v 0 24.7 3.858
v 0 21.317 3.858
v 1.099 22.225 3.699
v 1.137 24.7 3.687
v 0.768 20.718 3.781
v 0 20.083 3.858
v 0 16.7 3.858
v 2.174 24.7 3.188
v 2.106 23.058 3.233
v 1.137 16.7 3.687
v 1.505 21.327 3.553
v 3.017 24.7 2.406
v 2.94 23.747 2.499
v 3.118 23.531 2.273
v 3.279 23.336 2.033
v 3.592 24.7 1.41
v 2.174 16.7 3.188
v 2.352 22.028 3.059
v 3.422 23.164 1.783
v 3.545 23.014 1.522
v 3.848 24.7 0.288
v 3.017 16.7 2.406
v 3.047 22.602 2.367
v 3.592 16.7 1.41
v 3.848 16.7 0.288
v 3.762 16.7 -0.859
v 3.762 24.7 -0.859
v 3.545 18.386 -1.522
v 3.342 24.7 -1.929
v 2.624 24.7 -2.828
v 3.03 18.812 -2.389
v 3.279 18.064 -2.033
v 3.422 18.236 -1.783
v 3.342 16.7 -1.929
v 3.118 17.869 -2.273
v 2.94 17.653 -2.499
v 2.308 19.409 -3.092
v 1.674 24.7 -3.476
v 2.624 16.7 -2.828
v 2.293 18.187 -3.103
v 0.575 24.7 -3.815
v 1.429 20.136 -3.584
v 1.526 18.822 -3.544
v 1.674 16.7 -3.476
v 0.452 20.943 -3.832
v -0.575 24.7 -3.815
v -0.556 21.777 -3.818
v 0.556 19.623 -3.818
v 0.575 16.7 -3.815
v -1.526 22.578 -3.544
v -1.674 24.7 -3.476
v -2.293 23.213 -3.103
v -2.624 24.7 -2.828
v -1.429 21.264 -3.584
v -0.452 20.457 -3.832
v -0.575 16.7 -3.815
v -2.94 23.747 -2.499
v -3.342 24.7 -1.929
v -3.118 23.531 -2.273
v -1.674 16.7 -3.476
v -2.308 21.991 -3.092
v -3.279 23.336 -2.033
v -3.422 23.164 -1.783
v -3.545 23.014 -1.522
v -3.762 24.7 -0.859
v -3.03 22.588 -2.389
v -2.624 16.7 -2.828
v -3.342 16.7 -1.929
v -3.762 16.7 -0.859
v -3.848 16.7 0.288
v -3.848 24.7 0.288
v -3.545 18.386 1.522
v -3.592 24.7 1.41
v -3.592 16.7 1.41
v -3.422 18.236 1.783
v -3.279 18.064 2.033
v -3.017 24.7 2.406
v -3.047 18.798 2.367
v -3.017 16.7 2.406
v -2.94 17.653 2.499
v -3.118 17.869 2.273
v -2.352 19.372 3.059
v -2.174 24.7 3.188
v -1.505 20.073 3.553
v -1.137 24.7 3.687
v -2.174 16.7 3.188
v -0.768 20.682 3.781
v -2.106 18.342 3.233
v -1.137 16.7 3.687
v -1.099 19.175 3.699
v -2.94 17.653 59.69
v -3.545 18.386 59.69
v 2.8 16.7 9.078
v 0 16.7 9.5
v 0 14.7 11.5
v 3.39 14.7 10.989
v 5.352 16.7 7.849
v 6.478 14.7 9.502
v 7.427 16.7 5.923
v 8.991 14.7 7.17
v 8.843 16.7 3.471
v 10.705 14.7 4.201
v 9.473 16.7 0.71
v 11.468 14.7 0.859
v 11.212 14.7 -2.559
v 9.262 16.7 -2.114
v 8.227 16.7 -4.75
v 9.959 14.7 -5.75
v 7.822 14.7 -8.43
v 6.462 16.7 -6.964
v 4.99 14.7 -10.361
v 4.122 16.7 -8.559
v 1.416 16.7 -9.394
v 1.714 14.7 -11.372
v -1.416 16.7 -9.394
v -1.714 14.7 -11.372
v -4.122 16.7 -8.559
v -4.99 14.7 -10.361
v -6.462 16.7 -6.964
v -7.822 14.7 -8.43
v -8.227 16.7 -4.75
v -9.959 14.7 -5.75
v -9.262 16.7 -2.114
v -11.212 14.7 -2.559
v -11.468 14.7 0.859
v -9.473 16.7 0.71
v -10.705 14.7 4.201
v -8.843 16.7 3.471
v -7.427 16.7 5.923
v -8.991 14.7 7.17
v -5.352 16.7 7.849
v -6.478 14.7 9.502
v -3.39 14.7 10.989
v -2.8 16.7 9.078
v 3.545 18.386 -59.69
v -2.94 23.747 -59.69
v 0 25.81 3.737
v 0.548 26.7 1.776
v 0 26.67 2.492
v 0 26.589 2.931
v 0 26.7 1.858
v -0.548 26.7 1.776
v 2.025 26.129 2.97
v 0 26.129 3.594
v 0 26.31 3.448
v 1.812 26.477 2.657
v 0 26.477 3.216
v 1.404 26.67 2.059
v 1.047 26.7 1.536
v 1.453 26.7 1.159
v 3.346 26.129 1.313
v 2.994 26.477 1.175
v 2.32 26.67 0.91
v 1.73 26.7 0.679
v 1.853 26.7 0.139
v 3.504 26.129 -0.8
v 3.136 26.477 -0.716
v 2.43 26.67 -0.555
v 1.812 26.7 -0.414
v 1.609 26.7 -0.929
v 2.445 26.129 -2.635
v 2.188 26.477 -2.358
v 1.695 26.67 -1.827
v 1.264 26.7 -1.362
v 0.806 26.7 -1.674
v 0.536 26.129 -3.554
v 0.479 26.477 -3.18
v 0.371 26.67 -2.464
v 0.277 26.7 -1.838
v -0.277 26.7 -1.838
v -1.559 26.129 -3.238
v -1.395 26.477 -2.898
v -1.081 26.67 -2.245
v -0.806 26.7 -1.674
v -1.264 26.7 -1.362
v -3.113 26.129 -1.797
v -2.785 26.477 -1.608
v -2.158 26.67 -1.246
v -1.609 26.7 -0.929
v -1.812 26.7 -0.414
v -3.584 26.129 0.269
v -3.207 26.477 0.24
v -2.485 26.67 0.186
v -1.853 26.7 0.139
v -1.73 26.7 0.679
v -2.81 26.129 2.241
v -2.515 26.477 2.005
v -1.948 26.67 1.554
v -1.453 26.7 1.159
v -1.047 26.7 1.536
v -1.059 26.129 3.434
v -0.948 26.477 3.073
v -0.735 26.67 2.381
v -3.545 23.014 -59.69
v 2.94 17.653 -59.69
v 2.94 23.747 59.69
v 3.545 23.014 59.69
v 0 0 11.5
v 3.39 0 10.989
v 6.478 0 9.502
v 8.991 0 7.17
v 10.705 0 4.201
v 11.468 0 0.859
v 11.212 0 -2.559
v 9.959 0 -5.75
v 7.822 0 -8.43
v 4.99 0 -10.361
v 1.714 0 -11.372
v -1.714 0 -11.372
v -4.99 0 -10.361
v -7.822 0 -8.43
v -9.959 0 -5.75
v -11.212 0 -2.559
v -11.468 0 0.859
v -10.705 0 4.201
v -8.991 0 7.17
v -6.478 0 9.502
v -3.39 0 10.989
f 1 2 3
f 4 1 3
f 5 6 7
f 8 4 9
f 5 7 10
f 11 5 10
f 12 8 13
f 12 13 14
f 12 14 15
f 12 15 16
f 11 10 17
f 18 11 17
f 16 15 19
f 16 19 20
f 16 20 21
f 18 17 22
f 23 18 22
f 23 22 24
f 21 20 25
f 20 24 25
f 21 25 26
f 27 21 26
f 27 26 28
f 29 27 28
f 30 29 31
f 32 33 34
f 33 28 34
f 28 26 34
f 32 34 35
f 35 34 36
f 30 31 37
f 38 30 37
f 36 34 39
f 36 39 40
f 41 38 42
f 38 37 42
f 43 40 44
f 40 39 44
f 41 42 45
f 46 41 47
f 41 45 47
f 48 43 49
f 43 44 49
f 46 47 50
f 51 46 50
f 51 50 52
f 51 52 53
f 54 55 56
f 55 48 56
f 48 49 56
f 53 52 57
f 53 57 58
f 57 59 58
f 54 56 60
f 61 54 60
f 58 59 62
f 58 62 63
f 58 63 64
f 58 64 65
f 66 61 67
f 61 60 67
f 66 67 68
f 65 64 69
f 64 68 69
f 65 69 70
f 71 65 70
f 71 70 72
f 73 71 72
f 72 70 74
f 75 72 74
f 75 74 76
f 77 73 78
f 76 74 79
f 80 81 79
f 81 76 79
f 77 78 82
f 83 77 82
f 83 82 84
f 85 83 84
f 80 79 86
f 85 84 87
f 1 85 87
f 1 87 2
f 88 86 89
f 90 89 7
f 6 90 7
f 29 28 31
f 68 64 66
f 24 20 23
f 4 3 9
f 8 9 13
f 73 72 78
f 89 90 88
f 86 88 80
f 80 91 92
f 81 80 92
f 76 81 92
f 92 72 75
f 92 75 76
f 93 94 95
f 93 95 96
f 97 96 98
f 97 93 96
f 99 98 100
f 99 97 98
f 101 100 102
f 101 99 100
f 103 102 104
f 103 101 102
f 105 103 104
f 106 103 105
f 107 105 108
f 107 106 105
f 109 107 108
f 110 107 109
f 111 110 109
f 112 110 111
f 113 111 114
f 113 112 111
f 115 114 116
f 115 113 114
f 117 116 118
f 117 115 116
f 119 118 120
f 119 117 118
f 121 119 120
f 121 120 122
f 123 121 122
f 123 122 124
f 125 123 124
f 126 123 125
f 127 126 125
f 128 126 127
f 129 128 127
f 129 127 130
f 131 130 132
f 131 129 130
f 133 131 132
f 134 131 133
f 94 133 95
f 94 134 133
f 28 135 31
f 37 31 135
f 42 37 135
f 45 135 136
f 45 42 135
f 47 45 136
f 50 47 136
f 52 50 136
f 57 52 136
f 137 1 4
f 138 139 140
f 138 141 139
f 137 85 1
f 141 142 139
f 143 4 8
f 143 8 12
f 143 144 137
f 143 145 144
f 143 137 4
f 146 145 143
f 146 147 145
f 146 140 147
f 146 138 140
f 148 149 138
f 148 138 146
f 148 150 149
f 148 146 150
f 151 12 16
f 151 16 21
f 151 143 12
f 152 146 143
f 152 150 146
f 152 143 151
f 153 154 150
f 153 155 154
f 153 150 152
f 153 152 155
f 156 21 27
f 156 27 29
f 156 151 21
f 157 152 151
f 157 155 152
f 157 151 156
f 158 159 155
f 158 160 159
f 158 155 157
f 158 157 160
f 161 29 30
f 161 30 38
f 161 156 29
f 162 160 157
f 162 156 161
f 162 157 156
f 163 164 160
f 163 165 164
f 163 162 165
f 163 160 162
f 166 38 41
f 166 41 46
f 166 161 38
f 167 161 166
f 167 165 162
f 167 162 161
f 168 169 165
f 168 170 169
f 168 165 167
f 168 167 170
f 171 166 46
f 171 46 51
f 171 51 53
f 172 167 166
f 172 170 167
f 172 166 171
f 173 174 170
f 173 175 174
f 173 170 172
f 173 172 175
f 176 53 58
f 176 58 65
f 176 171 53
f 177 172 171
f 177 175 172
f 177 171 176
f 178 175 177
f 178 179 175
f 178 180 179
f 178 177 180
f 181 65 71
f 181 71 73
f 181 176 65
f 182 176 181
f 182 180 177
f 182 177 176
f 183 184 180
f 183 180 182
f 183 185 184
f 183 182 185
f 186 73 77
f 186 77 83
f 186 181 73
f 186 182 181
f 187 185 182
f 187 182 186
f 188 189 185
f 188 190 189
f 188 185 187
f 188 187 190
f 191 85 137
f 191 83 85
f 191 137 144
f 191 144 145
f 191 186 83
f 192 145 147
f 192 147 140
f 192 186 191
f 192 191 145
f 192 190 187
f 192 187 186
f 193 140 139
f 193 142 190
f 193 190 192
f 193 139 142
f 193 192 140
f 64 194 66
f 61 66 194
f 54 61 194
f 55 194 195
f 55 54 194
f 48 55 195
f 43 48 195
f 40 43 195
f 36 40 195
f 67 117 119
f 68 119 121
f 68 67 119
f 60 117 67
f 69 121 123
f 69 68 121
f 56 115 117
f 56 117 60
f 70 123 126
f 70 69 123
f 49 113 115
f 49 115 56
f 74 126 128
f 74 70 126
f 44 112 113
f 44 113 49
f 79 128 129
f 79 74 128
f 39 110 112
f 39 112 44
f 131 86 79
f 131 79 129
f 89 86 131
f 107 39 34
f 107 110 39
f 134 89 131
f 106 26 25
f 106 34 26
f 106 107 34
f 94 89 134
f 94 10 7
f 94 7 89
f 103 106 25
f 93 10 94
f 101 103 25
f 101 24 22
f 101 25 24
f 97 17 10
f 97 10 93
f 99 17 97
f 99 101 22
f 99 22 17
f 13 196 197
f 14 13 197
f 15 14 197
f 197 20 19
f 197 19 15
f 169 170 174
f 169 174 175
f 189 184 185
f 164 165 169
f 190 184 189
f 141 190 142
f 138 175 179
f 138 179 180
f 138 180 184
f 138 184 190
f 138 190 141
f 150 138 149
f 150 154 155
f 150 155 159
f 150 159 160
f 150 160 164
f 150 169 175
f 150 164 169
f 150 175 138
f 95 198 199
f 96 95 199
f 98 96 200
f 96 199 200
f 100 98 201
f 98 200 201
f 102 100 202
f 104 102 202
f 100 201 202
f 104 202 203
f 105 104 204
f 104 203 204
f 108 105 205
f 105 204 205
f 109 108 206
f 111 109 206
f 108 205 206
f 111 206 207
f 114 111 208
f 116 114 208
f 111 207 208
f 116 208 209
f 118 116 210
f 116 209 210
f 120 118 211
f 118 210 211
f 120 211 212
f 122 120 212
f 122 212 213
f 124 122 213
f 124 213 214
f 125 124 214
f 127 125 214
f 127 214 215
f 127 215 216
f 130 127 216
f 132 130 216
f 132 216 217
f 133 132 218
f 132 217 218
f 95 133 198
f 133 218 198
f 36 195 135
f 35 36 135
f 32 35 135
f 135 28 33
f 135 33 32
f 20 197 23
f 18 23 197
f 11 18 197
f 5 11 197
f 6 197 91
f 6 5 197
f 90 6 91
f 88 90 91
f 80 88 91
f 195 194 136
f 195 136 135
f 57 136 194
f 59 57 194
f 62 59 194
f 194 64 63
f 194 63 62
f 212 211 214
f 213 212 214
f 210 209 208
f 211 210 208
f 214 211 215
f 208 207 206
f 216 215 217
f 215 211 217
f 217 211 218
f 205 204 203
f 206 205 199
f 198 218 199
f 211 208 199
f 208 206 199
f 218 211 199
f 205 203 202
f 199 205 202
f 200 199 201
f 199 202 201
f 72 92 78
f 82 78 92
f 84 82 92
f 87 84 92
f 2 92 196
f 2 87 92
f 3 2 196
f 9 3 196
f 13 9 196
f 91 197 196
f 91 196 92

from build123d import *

# Parameters (mm, degrees)
SKETCH1_R           = 11.5
BOSS_EXTRUDE1_DEPTH = 16.7
SKETCH2_R           = 2.5
BOSS_EXTRUDE2_DEPTH = 10
CHAMFER1_SIZE       = 2
SKETCH3_R           = 3.858432037
SKETCH3_R_2         = 2.5
BOSS_EXTRUDE3_DEPTH = 10
BOSS_EXTRUDE4_DEPTH = 59.69
CIRPATTERN1_COUNT   = 2
FILLET2_SIZE        = 2


with BuildPart() as part:
    # Sketch1 → Boss-Extrude1 (new body)
    with BuildSketch(Plane(origin=(0, 0, 0), x_dir=(1, 0, 0), z_dir=(0, 1, 0))):
        with Locations(Location((0, 0, 0), (0, 0, 270))):
            Circle(SKETCH1_R)
    extrude(amount=BOSS_EXTRUDE1_DEPTH)

    # Sketch2 → Boss-Extrude2 (add)
    with BuildSketch(Plane(origin=(0, 16.7, 0), x_dir=(1, 0, 0), z_dir=(0, 1, 0))):
        with Locations(Location((0, 0, 0), (0, 0, 270))):
            Circle(SKETCH2_R)
    extrude(amount=BOSS_EXTRUDE2_DEPTH)

    # Chamfer1
    chamfer1_edges = [part.edges().sort_by_distance(p)[0] for p in [
        (0, 16.7, -11.5),
    ]]
    chamfer(chamfer1_edges, length=CHAMFER1_SIZE)

    # Sketch3 → Boss-Extrude3 (add)
    with BuildSketch(Plane(origin=(0, 16.7, 0), x_dir=(1, 0, 0), z_dir=(0, 1, 0))):
        with Locations(Location((0, 0, 0), (0, 0, 270))):
            Circle(SKETCH3_R)
        Circle(SKETCH3_R_2, mode=Mode.SUBTRACT)
    extrude(amount=BOSS_EXTRUDE3_DEPTH)

    # Sketch4 → Boss-Extrude4 (add)
    with BuildSketch(Plane.XY):
        Polygon((-3.545481948, 18.385879185), (2.939679684, 23.746946134), (3.545481948, 23.014120815), (-2.939679684, 17.653053866), align=None)
    boss_extrude4 = extrude(amount=BOSS_EXTRUDE4_DEPTH)

    # CirPattern1: Boss-Extrude4 ×2 about axis
    cirpattern1_axis = Axis((0, 0, 0), (0, 1, 0))
    for i in range(1, CIRPATTERN1_COUNT):
        add(boss_extrude4.rotate(cirpattern1_axis, i * 360 / CIRPATTERN1_COUNT))

    # Fillet2
    # a fillet whose section is not a circle: 2 mm, written as the material it takes off along each edge
    with BuildSketch(Plane(origin=(0, 26.7, 0), x_dir=(0, 0, 1), z_dir=(-1, 0, 0))) as fillet2_piece_1:
        with BuildLine():
            Bezier((3.858432037, -FILLET2_SIZE), (3.858432037, 0), (3.858432037 - FILLET2_SIZE, 0), weights=[1, 1.5, 1])
            Line((3.858432037 - FILLET2_SIZE, 0), (3.858432037, 0))
            Line((3.858432037, 0), (3.858432037, -FILLET2_SIZE))
        make_face()
    revolve(axis=Axis((0, 26.7, 0), (0, 1, 0)), mode=Mode.SUBTRACT)


solid = part.part
